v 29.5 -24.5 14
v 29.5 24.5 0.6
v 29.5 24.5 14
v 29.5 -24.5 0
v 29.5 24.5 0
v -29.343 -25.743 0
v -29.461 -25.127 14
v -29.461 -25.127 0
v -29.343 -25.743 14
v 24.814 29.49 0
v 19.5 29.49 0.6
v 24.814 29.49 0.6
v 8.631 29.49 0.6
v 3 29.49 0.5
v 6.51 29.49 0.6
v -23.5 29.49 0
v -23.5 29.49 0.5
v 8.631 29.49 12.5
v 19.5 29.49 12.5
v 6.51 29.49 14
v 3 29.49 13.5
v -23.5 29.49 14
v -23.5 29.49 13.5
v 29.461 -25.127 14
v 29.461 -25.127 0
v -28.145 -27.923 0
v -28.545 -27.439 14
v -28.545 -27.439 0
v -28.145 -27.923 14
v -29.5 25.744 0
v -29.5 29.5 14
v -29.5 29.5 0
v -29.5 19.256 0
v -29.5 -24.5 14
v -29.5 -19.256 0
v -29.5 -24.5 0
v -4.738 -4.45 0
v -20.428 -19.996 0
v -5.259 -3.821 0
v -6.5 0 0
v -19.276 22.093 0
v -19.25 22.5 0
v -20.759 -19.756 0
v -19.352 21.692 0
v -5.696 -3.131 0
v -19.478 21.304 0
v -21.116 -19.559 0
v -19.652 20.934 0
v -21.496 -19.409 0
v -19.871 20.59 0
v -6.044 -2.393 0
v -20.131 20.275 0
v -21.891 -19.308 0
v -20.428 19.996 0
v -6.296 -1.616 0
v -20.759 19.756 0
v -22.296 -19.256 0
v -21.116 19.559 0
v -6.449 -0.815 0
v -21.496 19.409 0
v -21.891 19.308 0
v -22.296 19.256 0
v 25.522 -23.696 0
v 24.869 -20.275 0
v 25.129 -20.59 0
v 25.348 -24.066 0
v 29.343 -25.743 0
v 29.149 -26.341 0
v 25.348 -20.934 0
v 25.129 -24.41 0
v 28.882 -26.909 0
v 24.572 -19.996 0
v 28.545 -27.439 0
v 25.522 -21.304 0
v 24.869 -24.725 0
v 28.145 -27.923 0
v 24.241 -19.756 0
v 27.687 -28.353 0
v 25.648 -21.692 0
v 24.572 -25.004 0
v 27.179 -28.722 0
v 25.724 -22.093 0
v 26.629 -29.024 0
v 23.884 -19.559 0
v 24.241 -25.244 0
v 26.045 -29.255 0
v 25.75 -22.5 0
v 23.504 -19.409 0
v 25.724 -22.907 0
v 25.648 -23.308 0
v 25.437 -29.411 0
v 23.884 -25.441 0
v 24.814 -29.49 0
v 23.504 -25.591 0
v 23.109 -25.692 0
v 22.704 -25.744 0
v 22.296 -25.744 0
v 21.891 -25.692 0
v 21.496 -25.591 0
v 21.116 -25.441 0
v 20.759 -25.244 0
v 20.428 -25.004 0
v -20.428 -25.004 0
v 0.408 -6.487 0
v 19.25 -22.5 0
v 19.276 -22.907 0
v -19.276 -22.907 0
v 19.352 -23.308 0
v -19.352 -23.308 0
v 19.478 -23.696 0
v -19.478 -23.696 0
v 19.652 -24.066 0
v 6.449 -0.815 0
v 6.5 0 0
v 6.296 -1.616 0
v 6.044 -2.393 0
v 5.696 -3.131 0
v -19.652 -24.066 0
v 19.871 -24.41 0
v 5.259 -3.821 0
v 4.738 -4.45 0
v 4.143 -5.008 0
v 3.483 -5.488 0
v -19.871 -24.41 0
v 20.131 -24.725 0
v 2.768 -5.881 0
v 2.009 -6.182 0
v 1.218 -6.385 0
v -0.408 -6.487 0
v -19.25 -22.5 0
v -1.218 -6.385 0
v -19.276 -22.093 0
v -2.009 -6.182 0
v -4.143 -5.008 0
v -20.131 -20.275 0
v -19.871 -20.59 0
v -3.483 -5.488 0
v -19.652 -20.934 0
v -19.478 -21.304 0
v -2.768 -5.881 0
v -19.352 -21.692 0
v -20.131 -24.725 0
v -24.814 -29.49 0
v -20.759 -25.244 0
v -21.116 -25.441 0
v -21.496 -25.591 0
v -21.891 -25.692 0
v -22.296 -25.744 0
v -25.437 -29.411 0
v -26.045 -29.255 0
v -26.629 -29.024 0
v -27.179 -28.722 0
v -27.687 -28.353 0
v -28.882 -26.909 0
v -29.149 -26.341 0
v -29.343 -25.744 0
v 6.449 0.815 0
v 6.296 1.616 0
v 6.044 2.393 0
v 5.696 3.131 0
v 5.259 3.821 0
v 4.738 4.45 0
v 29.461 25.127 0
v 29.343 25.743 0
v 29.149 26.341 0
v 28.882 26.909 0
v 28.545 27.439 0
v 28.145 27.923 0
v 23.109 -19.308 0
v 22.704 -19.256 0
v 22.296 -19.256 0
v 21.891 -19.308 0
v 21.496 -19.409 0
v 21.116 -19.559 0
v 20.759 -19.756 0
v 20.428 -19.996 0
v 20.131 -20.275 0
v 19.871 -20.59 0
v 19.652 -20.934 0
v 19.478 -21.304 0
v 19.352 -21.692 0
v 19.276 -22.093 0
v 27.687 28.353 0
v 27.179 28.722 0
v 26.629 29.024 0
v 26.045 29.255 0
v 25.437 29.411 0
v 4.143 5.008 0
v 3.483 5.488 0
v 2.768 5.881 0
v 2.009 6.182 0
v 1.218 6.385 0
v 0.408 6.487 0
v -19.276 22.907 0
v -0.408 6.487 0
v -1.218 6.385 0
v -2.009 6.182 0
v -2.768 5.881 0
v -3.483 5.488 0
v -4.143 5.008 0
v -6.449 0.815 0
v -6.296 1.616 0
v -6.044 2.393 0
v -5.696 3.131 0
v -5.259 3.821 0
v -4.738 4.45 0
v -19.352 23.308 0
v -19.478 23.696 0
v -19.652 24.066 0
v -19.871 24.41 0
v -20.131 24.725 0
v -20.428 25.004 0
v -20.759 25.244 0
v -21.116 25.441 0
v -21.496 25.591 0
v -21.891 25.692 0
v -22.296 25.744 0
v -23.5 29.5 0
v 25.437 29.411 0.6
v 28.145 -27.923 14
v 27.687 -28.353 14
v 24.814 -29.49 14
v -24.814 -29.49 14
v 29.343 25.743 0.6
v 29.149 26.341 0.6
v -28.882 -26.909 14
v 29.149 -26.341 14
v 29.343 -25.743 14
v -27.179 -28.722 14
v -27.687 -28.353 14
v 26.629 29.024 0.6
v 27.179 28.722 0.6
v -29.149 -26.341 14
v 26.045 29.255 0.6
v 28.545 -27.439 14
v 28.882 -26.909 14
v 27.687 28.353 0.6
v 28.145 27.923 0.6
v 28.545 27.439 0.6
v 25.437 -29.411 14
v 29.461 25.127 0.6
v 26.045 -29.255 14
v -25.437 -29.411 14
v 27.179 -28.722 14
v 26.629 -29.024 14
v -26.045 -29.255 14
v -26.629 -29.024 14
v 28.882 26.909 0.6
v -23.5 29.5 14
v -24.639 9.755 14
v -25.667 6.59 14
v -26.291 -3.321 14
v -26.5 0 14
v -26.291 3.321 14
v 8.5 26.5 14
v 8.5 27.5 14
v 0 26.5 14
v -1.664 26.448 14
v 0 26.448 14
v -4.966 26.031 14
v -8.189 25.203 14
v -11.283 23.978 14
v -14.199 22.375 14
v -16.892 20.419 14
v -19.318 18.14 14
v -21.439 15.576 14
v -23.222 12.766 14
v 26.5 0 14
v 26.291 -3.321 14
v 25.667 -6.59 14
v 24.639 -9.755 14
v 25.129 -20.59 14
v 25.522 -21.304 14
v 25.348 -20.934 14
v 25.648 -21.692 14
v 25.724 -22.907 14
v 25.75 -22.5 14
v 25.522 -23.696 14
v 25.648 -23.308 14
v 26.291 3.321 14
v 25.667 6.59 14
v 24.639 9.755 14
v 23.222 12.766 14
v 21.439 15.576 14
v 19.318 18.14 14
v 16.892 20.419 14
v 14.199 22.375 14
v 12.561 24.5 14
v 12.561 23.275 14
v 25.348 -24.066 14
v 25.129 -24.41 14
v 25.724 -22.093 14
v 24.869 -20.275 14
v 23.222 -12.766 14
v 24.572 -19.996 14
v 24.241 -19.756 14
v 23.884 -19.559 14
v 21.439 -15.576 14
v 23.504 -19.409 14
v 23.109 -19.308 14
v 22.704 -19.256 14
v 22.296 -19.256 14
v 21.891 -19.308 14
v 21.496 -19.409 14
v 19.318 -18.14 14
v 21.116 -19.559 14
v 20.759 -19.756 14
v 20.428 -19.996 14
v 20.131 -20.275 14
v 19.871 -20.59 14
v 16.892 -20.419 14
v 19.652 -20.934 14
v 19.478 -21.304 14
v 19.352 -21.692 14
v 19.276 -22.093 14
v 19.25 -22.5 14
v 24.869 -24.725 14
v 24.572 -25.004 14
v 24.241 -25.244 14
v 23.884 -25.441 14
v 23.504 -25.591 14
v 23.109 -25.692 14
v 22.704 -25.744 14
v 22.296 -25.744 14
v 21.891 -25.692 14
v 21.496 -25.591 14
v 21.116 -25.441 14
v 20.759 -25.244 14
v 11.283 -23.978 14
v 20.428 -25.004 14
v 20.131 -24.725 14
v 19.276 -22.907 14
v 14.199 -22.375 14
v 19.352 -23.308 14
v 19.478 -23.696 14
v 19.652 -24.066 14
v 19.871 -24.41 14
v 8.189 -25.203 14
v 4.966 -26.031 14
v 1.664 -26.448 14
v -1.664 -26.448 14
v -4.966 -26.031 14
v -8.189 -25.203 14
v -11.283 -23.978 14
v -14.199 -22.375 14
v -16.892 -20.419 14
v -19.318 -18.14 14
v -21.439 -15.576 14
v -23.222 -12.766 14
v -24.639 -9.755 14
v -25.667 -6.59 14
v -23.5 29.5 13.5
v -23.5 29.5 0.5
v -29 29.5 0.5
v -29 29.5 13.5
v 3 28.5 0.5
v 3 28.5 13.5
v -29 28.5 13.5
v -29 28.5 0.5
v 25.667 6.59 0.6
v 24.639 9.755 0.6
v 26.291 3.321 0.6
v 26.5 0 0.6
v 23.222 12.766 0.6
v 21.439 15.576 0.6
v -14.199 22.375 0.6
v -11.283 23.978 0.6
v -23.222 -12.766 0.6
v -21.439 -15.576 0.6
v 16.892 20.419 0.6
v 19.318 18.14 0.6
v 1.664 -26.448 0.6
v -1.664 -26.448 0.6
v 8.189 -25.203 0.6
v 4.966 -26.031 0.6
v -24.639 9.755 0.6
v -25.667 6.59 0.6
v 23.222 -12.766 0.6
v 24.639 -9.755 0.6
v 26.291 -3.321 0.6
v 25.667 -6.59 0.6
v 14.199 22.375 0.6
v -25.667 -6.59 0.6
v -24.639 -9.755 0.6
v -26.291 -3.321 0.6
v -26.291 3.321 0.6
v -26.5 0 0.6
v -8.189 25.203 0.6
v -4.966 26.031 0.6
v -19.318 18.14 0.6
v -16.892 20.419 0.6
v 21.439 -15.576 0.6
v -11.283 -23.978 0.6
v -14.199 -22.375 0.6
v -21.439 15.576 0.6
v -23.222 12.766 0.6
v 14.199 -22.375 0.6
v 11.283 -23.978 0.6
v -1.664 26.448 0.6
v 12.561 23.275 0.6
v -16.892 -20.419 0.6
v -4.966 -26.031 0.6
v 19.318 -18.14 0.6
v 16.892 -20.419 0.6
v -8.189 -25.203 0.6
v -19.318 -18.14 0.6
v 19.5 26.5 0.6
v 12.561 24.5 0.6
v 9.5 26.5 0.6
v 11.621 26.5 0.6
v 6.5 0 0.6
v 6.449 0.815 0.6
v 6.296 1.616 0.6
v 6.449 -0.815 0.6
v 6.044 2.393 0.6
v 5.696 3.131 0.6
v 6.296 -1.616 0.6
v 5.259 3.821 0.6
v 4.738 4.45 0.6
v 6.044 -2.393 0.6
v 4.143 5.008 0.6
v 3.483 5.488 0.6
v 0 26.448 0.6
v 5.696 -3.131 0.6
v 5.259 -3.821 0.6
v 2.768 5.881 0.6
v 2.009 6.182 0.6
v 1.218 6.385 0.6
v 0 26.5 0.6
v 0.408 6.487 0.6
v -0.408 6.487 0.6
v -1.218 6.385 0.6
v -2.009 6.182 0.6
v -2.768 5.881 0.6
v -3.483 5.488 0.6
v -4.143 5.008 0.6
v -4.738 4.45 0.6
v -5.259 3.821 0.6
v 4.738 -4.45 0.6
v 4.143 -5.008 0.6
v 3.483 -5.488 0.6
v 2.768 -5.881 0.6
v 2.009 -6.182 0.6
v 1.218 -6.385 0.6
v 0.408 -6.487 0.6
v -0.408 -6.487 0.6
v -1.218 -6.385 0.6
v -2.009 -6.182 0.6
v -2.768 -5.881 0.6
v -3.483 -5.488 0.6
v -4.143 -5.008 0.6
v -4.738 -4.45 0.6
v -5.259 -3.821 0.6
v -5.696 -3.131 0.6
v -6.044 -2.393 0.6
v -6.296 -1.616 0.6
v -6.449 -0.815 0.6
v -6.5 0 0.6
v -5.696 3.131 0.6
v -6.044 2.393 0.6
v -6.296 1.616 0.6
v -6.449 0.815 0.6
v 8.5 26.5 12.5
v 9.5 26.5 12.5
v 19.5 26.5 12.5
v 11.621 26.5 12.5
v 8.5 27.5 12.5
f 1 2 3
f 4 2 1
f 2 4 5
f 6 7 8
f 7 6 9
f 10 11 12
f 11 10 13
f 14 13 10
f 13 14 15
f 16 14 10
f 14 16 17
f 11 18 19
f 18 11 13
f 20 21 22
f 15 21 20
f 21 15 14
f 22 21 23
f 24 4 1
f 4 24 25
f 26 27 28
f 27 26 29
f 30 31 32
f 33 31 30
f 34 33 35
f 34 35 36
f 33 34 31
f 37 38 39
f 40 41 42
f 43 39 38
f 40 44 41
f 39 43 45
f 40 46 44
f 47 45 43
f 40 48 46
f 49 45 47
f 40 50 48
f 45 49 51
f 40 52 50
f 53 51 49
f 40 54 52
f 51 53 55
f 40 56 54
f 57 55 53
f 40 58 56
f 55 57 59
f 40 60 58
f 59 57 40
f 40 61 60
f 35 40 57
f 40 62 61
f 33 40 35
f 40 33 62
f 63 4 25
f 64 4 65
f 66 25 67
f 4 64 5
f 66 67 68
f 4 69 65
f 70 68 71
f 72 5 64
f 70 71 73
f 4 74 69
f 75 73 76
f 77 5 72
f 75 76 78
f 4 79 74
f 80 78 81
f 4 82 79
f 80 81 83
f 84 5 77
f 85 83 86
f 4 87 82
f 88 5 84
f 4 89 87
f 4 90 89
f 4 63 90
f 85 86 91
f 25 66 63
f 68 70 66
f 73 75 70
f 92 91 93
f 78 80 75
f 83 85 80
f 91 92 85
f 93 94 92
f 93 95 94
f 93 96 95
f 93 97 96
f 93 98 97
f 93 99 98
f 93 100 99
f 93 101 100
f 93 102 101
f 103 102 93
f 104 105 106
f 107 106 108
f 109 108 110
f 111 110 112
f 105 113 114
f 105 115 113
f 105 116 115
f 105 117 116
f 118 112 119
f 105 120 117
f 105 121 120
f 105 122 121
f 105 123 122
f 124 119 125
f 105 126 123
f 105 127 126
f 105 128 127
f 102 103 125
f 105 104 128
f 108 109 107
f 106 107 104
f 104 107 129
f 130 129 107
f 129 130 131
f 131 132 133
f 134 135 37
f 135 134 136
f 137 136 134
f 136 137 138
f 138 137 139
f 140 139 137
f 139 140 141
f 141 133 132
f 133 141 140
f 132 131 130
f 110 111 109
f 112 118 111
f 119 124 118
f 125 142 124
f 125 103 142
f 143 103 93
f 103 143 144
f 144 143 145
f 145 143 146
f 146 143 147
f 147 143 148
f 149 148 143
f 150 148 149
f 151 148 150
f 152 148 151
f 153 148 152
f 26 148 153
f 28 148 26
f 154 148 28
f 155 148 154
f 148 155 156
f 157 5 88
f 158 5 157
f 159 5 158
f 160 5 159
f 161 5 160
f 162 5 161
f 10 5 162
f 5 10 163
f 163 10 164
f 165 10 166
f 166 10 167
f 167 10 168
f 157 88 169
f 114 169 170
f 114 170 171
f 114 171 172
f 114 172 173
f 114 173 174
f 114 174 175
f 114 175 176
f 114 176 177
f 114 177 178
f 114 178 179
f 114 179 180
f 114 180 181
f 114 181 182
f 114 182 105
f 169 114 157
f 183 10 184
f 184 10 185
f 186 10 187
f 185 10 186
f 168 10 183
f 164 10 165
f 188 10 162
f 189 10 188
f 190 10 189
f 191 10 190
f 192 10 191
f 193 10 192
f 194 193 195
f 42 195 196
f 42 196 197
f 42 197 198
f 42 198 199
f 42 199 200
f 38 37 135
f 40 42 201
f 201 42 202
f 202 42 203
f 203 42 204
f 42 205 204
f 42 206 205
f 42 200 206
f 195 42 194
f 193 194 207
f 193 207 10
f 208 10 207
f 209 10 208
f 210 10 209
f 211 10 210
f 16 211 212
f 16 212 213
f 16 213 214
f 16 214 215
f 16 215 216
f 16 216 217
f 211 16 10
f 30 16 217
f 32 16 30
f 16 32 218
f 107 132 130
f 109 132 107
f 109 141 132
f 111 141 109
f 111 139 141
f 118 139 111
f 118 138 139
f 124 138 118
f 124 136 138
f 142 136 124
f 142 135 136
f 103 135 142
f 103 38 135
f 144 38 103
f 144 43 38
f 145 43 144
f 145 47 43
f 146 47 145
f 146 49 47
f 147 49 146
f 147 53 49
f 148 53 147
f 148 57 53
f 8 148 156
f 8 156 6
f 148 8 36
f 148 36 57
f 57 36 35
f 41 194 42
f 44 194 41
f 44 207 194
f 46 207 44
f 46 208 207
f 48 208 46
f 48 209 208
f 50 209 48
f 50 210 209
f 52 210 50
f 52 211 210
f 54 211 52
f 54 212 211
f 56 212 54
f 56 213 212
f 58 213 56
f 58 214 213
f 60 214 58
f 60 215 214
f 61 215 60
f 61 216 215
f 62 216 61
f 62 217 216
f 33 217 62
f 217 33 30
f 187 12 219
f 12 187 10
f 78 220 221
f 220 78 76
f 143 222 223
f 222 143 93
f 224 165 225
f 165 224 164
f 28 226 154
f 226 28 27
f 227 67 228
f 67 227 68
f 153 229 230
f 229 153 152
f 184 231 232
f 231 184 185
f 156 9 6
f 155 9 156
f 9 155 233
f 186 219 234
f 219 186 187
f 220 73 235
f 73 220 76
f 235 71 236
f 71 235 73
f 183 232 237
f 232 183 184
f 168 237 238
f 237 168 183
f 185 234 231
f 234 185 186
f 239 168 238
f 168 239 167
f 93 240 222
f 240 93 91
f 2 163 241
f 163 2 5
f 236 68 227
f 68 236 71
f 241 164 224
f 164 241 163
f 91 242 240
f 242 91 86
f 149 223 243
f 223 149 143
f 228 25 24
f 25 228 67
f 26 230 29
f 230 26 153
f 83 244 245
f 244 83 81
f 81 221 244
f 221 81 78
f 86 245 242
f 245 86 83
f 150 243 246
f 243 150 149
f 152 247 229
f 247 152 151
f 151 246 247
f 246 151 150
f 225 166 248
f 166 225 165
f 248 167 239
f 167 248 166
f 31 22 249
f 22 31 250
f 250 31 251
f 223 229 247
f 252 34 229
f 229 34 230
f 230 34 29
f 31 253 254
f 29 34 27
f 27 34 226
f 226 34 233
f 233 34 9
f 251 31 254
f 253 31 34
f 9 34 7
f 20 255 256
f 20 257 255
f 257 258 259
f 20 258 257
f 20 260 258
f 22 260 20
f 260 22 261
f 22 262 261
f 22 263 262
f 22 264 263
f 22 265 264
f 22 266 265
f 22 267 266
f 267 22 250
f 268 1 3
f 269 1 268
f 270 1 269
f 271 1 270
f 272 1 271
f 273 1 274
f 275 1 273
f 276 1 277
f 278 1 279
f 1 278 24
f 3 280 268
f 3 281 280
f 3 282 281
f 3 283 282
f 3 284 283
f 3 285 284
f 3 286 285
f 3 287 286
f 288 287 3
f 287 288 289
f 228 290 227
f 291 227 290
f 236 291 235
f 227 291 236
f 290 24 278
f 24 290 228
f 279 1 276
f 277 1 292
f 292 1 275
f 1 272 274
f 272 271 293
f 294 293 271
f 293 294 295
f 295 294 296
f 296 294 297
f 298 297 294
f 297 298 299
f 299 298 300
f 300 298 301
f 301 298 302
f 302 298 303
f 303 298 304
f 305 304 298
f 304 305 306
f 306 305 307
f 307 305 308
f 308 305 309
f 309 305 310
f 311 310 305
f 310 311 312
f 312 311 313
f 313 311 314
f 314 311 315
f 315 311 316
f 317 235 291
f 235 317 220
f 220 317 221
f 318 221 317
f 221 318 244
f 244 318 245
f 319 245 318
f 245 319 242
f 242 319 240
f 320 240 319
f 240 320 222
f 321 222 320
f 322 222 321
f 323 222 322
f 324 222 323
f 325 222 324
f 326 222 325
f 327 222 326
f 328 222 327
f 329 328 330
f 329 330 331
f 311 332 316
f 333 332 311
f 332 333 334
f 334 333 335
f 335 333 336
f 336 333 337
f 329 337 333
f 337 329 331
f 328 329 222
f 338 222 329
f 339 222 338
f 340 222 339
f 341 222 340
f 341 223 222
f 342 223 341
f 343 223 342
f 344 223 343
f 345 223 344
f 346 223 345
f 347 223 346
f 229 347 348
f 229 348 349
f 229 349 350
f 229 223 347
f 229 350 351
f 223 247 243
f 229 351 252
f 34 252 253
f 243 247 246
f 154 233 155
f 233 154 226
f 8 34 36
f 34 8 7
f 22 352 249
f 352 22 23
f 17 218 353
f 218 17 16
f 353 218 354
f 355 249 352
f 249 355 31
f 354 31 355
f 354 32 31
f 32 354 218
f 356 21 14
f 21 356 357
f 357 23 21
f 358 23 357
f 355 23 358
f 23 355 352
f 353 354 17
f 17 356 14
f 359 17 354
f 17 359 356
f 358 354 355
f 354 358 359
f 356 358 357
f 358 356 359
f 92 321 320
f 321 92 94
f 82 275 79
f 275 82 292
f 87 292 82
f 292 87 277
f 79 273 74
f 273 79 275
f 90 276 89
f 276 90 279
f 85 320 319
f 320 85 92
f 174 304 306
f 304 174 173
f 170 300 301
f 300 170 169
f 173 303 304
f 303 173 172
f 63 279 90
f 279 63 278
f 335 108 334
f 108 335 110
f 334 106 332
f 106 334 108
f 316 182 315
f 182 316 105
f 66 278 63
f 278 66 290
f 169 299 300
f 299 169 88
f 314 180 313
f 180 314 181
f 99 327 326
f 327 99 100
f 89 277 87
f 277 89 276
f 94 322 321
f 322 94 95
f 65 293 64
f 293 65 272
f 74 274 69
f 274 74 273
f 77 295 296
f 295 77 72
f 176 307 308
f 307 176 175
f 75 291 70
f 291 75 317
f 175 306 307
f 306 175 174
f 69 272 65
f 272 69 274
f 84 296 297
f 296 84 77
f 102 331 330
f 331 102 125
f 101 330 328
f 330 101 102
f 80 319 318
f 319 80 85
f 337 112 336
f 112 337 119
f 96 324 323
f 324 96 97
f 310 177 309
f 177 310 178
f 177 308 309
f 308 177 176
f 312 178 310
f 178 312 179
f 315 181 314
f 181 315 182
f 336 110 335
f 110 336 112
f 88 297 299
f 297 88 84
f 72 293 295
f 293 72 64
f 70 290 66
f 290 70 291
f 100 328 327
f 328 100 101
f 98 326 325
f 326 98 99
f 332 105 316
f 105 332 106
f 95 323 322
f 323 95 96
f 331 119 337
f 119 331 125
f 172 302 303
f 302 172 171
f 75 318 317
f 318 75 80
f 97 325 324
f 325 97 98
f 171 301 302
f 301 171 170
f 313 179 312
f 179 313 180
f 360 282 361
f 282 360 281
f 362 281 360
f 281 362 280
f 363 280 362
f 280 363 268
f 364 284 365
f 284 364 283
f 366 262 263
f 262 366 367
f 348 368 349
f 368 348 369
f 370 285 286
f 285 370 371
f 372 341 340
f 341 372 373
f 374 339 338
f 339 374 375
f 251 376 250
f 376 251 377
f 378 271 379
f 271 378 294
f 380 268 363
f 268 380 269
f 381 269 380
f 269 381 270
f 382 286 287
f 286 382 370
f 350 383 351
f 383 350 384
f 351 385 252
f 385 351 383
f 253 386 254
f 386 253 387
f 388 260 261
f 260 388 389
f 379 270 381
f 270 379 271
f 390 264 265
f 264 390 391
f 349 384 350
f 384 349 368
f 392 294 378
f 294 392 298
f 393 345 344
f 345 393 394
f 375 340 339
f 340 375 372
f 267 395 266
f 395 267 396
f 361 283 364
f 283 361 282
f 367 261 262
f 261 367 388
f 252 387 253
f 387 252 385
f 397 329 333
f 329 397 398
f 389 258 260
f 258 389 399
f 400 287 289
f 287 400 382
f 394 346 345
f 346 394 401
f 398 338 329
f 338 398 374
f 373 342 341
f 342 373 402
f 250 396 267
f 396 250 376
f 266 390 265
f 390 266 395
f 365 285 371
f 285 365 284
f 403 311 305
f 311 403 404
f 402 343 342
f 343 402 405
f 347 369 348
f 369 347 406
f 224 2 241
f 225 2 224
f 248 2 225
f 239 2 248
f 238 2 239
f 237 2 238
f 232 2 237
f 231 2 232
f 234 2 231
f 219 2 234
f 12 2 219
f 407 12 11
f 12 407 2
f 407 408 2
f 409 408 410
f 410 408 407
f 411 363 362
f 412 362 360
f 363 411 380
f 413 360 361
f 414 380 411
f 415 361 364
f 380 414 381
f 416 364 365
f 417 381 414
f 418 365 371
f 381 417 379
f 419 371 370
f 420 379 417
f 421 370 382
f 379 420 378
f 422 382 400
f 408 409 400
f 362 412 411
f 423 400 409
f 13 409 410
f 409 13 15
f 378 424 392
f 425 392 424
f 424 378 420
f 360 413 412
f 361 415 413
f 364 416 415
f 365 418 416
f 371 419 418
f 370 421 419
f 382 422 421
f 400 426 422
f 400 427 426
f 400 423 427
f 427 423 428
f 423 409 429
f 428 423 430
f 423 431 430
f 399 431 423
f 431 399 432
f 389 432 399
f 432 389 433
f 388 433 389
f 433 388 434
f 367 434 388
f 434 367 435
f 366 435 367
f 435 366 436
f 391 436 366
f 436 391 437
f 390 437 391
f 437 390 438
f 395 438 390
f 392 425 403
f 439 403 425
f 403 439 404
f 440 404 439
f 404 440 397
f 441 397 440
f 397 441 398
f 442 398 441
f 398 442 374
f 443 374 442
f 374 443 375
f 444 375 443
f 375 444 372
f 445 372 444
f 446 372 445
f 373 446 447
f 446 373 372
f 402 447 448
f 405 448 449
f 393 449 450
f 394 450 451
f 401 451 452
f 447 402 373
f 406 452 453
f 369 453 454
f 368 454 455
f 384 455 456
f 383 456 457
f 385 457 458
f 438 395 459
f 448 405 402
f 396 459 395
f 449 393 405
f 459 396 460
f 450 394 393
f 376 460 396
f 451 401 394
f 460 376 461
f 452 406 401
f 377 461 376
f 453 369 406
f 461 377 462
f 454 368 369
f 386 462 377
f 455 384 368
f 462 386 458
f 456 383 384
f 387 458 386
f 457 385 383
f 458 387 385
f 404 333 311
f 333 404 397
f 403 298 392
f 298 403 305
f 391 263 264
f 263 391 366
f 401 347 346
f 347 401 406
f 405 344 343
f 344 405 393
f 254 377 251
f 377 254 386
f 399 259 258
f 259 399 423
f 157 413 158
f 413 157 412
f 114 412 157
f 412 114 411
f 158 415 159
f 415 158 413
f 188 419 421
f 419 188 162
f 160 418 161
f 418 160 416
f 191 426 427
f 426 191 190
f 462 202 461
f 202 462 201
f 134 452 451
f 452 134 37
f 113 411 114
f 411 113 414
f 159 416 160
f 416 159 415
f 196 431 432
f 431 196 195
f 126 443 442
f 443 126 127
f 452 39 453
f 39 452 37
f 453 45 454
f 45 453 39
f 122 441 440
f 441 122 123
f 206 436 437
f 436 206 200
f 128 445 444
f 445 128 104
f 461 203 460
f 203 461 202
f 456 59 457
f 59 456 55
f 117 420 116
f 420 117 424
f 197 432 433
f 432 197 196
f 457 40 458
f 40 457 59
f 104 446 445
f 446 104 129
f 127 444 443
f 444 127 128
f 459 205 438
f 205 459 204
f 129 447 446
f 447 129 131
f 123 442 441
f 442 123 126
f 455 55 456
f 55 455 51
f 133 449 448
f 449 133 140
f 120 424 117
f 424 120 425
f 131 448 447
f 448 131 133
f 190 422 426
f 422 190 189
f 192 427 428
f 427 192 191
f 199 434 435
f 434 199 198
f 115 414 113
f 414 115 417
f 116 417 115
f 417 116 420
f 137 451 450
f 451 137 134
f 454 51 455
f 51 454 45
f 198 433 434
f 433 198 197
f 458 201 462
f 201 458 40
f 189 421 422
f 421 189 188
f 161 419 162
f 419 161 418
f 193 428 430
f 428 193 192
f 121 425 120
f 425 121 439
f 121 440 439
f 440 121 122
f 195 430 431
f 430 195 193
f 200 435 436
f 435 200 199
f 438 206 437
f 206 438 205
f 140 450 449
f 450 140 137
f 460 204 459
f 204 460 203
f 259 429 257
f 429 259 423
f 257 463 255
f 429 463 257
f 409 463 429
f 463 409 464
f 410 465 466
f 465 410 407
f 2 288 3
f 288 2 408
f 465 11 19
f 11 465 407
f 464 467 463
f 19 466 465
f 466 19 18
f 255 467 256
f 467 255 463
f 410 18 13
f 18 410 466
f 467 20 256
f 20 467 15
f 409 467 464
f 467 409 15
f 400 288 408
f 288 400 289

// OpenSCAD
$fn = 50;


difference() {
	union() {
		hull() {
			translate(v = [-24.5000000000, 24.5000000000, 0]) {
				cylinder(h = 14, r = 5);
			}
			translate(v = [24.5000000000, 24.5000000000, 0]) {
				cylinder(h = 14, r = 5);
			}
			translate(v = [-24.5000000000, -24.5000000000, 0]) {
				cylinder(h = 14, r = 5);
			}
			translate(v = [24.5000000000, -24.5000000000, 0]) {
				cylinder(h = 14, r = 5);
			}
		}
		translate(v = [-29.5000000000, 23.5000000000, 0]) {
			cube(size = [6, 6, 14]);
		}
	}
	union() {
		translate(v = [-30.0000000000, -22.5000000000, -250.0000000000]) {
			rotate(a = [0, 0, 0]) {
				difference() {
					union() {
						hull() {
							translate(v = [7.5000000000, 0, 0]) {
								cylinder(h = 250, r = 3.2500000000, r1 = 3.2500000000, r2 = 3.2500000000);
							}
							translate(v = [-7.5000000000, 0, 0]) {
								cylinder(h = 250, r = 3.2500000000, r1 = 3.2500000000, r2 = 3.2500000000);
							}
						}
					}
					union();
				}
			}
		}
		translate(v = [-30.0000000000, 22.5000000000, -250.0000000000]) {
			rotate(a = [0, 0, 0]) {
				difference() {
					union() {
						hull() {
							translate(v = [7.5000000000, 0, 0]) {
								cylinder(h = 250, r = 3.2500000000, r1 = 3.2500000000, r2 = 3.2500000000);
							}
							translate(v = [-7.5000000000, 0, 0]) {
								cylinder(h = 250, r = 3.2500000000, r1 = 3.2500000000, r2 = 3.2500000000);
							}
						}
					}
					union();
				}
			}
		}
		translate(v = [-29.0000000000, 28.5000000000, 0.5000000000]) {
			cube(size = [32, 1, 13.0000000000]);
		}
		translate(v = [22.5000000000, -22.5000000000, -50.0000000000]) {
			cylinder(h = 100, r = 3.2500000000);
		}
		translate(v = [0, 0, 0.6000000000]) {
			cylinder(h = 16.4000000000, r = 26.5000000000);
		}
		translate(v = [0, 0, -7.0000000000]) {
			cylinder(h = 14, r = 6.5000000000);
		}
		translate(v = [0.0000000000, 24.5000000000, 0.6000000000]) {
			cube(size = [29.5000000000, 2, 16.4000000000]);
		}
		translate(v = [19.5000000000, 24.5000000000, 0.6000000000]) {
			cube(size = [10, 5, 16.4000000000]);
		}
		translate(v = [8.5000000000, 24.5000000000, 12.5000000000]) {
			cube(size = [21, 5, 1.5000000000]);
		}
		translate(v = [5.7500000000, 30.2500000000, 0.6000000000]) {
			rotate(a = [0, 0, -45]) {
				cube(size = [7.5000000000, 1.5000000000, 16.4000000000]);
			}
		}
		translate(v = [5.0610000000, 22.5000000000, 0.6000000000]) {
			cube(size = [7.5000000000, 2, 13.4000000000]);
		}
	}
}
